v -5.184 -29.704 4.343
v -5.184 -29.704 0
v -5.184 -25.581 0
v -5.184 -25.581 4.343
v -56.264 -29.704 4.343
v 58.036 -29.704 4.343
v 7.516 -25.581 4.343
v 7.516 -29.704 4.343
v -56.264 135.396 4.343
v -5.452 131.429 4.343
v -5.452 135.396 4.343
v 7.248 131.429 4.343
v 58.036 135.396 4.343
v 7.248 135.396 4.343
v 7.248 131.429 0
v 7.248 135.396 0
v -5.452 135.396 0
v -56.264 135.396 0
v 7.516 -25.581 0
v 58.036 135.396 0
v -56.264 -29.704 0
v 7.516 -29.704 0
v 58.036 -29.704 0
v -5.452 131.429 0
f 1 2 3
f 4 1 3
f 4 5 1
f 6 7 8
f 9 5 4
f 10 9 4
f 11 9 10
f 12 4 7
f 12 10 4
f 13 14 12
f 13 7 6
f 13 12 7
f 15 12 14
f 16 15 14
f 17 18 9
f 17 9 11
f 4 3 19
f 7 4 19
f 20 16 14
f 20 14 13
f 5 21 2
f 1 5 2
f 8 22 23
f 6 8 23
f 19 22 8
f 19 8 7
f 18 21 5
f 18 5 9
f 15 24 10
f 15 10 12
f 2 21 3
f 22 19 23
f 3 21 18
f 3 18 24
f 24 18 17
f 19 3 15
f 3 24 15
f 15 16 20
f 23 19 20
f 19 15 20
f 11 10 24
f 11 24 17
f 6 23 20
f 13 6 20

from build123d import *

# Parameters (mm, degrees)
F0_W     = 114.3
F0_H     = 165.1
F1_DEPTH = 4.3434
F3_W     = 12.7
F3_H     = 4.3434
F4_DEPTH = 4.3444
F5_W     = 12.7
F5_H     = 4.3434
F6_DEPTH = 4.3444


with BuildPart() as f1:
    # F0 (on Top) → F1 (new body)
    with BuildSketch(Plane.XY):
        with Locations((0.885719, 52.846001)):
            Rectangle(F0_W, F0_H)
    extrude(amount=F1_DEPTH)

    # F3 (on Top) → F4 (cut, through all)
    with BuildSketch(Plane.XY):
        with Locations((1.166433, -27.752964)):
            Rectangle(F3_W, F3_H)
    extrude(amount=F4_DEPTH, mode=Mode.SUBTRACT)

    # F5 (on Top) → F6 (cut, through all)
    with BuildSketch(Plane.XY):
        with Locations((0.897519, 133.60057)):
            Rectangle(F5_W, F5_H)
    extrude(amount=F6_DEPTH, mode=Mode.SUBTRACT)


solid = f1.part
